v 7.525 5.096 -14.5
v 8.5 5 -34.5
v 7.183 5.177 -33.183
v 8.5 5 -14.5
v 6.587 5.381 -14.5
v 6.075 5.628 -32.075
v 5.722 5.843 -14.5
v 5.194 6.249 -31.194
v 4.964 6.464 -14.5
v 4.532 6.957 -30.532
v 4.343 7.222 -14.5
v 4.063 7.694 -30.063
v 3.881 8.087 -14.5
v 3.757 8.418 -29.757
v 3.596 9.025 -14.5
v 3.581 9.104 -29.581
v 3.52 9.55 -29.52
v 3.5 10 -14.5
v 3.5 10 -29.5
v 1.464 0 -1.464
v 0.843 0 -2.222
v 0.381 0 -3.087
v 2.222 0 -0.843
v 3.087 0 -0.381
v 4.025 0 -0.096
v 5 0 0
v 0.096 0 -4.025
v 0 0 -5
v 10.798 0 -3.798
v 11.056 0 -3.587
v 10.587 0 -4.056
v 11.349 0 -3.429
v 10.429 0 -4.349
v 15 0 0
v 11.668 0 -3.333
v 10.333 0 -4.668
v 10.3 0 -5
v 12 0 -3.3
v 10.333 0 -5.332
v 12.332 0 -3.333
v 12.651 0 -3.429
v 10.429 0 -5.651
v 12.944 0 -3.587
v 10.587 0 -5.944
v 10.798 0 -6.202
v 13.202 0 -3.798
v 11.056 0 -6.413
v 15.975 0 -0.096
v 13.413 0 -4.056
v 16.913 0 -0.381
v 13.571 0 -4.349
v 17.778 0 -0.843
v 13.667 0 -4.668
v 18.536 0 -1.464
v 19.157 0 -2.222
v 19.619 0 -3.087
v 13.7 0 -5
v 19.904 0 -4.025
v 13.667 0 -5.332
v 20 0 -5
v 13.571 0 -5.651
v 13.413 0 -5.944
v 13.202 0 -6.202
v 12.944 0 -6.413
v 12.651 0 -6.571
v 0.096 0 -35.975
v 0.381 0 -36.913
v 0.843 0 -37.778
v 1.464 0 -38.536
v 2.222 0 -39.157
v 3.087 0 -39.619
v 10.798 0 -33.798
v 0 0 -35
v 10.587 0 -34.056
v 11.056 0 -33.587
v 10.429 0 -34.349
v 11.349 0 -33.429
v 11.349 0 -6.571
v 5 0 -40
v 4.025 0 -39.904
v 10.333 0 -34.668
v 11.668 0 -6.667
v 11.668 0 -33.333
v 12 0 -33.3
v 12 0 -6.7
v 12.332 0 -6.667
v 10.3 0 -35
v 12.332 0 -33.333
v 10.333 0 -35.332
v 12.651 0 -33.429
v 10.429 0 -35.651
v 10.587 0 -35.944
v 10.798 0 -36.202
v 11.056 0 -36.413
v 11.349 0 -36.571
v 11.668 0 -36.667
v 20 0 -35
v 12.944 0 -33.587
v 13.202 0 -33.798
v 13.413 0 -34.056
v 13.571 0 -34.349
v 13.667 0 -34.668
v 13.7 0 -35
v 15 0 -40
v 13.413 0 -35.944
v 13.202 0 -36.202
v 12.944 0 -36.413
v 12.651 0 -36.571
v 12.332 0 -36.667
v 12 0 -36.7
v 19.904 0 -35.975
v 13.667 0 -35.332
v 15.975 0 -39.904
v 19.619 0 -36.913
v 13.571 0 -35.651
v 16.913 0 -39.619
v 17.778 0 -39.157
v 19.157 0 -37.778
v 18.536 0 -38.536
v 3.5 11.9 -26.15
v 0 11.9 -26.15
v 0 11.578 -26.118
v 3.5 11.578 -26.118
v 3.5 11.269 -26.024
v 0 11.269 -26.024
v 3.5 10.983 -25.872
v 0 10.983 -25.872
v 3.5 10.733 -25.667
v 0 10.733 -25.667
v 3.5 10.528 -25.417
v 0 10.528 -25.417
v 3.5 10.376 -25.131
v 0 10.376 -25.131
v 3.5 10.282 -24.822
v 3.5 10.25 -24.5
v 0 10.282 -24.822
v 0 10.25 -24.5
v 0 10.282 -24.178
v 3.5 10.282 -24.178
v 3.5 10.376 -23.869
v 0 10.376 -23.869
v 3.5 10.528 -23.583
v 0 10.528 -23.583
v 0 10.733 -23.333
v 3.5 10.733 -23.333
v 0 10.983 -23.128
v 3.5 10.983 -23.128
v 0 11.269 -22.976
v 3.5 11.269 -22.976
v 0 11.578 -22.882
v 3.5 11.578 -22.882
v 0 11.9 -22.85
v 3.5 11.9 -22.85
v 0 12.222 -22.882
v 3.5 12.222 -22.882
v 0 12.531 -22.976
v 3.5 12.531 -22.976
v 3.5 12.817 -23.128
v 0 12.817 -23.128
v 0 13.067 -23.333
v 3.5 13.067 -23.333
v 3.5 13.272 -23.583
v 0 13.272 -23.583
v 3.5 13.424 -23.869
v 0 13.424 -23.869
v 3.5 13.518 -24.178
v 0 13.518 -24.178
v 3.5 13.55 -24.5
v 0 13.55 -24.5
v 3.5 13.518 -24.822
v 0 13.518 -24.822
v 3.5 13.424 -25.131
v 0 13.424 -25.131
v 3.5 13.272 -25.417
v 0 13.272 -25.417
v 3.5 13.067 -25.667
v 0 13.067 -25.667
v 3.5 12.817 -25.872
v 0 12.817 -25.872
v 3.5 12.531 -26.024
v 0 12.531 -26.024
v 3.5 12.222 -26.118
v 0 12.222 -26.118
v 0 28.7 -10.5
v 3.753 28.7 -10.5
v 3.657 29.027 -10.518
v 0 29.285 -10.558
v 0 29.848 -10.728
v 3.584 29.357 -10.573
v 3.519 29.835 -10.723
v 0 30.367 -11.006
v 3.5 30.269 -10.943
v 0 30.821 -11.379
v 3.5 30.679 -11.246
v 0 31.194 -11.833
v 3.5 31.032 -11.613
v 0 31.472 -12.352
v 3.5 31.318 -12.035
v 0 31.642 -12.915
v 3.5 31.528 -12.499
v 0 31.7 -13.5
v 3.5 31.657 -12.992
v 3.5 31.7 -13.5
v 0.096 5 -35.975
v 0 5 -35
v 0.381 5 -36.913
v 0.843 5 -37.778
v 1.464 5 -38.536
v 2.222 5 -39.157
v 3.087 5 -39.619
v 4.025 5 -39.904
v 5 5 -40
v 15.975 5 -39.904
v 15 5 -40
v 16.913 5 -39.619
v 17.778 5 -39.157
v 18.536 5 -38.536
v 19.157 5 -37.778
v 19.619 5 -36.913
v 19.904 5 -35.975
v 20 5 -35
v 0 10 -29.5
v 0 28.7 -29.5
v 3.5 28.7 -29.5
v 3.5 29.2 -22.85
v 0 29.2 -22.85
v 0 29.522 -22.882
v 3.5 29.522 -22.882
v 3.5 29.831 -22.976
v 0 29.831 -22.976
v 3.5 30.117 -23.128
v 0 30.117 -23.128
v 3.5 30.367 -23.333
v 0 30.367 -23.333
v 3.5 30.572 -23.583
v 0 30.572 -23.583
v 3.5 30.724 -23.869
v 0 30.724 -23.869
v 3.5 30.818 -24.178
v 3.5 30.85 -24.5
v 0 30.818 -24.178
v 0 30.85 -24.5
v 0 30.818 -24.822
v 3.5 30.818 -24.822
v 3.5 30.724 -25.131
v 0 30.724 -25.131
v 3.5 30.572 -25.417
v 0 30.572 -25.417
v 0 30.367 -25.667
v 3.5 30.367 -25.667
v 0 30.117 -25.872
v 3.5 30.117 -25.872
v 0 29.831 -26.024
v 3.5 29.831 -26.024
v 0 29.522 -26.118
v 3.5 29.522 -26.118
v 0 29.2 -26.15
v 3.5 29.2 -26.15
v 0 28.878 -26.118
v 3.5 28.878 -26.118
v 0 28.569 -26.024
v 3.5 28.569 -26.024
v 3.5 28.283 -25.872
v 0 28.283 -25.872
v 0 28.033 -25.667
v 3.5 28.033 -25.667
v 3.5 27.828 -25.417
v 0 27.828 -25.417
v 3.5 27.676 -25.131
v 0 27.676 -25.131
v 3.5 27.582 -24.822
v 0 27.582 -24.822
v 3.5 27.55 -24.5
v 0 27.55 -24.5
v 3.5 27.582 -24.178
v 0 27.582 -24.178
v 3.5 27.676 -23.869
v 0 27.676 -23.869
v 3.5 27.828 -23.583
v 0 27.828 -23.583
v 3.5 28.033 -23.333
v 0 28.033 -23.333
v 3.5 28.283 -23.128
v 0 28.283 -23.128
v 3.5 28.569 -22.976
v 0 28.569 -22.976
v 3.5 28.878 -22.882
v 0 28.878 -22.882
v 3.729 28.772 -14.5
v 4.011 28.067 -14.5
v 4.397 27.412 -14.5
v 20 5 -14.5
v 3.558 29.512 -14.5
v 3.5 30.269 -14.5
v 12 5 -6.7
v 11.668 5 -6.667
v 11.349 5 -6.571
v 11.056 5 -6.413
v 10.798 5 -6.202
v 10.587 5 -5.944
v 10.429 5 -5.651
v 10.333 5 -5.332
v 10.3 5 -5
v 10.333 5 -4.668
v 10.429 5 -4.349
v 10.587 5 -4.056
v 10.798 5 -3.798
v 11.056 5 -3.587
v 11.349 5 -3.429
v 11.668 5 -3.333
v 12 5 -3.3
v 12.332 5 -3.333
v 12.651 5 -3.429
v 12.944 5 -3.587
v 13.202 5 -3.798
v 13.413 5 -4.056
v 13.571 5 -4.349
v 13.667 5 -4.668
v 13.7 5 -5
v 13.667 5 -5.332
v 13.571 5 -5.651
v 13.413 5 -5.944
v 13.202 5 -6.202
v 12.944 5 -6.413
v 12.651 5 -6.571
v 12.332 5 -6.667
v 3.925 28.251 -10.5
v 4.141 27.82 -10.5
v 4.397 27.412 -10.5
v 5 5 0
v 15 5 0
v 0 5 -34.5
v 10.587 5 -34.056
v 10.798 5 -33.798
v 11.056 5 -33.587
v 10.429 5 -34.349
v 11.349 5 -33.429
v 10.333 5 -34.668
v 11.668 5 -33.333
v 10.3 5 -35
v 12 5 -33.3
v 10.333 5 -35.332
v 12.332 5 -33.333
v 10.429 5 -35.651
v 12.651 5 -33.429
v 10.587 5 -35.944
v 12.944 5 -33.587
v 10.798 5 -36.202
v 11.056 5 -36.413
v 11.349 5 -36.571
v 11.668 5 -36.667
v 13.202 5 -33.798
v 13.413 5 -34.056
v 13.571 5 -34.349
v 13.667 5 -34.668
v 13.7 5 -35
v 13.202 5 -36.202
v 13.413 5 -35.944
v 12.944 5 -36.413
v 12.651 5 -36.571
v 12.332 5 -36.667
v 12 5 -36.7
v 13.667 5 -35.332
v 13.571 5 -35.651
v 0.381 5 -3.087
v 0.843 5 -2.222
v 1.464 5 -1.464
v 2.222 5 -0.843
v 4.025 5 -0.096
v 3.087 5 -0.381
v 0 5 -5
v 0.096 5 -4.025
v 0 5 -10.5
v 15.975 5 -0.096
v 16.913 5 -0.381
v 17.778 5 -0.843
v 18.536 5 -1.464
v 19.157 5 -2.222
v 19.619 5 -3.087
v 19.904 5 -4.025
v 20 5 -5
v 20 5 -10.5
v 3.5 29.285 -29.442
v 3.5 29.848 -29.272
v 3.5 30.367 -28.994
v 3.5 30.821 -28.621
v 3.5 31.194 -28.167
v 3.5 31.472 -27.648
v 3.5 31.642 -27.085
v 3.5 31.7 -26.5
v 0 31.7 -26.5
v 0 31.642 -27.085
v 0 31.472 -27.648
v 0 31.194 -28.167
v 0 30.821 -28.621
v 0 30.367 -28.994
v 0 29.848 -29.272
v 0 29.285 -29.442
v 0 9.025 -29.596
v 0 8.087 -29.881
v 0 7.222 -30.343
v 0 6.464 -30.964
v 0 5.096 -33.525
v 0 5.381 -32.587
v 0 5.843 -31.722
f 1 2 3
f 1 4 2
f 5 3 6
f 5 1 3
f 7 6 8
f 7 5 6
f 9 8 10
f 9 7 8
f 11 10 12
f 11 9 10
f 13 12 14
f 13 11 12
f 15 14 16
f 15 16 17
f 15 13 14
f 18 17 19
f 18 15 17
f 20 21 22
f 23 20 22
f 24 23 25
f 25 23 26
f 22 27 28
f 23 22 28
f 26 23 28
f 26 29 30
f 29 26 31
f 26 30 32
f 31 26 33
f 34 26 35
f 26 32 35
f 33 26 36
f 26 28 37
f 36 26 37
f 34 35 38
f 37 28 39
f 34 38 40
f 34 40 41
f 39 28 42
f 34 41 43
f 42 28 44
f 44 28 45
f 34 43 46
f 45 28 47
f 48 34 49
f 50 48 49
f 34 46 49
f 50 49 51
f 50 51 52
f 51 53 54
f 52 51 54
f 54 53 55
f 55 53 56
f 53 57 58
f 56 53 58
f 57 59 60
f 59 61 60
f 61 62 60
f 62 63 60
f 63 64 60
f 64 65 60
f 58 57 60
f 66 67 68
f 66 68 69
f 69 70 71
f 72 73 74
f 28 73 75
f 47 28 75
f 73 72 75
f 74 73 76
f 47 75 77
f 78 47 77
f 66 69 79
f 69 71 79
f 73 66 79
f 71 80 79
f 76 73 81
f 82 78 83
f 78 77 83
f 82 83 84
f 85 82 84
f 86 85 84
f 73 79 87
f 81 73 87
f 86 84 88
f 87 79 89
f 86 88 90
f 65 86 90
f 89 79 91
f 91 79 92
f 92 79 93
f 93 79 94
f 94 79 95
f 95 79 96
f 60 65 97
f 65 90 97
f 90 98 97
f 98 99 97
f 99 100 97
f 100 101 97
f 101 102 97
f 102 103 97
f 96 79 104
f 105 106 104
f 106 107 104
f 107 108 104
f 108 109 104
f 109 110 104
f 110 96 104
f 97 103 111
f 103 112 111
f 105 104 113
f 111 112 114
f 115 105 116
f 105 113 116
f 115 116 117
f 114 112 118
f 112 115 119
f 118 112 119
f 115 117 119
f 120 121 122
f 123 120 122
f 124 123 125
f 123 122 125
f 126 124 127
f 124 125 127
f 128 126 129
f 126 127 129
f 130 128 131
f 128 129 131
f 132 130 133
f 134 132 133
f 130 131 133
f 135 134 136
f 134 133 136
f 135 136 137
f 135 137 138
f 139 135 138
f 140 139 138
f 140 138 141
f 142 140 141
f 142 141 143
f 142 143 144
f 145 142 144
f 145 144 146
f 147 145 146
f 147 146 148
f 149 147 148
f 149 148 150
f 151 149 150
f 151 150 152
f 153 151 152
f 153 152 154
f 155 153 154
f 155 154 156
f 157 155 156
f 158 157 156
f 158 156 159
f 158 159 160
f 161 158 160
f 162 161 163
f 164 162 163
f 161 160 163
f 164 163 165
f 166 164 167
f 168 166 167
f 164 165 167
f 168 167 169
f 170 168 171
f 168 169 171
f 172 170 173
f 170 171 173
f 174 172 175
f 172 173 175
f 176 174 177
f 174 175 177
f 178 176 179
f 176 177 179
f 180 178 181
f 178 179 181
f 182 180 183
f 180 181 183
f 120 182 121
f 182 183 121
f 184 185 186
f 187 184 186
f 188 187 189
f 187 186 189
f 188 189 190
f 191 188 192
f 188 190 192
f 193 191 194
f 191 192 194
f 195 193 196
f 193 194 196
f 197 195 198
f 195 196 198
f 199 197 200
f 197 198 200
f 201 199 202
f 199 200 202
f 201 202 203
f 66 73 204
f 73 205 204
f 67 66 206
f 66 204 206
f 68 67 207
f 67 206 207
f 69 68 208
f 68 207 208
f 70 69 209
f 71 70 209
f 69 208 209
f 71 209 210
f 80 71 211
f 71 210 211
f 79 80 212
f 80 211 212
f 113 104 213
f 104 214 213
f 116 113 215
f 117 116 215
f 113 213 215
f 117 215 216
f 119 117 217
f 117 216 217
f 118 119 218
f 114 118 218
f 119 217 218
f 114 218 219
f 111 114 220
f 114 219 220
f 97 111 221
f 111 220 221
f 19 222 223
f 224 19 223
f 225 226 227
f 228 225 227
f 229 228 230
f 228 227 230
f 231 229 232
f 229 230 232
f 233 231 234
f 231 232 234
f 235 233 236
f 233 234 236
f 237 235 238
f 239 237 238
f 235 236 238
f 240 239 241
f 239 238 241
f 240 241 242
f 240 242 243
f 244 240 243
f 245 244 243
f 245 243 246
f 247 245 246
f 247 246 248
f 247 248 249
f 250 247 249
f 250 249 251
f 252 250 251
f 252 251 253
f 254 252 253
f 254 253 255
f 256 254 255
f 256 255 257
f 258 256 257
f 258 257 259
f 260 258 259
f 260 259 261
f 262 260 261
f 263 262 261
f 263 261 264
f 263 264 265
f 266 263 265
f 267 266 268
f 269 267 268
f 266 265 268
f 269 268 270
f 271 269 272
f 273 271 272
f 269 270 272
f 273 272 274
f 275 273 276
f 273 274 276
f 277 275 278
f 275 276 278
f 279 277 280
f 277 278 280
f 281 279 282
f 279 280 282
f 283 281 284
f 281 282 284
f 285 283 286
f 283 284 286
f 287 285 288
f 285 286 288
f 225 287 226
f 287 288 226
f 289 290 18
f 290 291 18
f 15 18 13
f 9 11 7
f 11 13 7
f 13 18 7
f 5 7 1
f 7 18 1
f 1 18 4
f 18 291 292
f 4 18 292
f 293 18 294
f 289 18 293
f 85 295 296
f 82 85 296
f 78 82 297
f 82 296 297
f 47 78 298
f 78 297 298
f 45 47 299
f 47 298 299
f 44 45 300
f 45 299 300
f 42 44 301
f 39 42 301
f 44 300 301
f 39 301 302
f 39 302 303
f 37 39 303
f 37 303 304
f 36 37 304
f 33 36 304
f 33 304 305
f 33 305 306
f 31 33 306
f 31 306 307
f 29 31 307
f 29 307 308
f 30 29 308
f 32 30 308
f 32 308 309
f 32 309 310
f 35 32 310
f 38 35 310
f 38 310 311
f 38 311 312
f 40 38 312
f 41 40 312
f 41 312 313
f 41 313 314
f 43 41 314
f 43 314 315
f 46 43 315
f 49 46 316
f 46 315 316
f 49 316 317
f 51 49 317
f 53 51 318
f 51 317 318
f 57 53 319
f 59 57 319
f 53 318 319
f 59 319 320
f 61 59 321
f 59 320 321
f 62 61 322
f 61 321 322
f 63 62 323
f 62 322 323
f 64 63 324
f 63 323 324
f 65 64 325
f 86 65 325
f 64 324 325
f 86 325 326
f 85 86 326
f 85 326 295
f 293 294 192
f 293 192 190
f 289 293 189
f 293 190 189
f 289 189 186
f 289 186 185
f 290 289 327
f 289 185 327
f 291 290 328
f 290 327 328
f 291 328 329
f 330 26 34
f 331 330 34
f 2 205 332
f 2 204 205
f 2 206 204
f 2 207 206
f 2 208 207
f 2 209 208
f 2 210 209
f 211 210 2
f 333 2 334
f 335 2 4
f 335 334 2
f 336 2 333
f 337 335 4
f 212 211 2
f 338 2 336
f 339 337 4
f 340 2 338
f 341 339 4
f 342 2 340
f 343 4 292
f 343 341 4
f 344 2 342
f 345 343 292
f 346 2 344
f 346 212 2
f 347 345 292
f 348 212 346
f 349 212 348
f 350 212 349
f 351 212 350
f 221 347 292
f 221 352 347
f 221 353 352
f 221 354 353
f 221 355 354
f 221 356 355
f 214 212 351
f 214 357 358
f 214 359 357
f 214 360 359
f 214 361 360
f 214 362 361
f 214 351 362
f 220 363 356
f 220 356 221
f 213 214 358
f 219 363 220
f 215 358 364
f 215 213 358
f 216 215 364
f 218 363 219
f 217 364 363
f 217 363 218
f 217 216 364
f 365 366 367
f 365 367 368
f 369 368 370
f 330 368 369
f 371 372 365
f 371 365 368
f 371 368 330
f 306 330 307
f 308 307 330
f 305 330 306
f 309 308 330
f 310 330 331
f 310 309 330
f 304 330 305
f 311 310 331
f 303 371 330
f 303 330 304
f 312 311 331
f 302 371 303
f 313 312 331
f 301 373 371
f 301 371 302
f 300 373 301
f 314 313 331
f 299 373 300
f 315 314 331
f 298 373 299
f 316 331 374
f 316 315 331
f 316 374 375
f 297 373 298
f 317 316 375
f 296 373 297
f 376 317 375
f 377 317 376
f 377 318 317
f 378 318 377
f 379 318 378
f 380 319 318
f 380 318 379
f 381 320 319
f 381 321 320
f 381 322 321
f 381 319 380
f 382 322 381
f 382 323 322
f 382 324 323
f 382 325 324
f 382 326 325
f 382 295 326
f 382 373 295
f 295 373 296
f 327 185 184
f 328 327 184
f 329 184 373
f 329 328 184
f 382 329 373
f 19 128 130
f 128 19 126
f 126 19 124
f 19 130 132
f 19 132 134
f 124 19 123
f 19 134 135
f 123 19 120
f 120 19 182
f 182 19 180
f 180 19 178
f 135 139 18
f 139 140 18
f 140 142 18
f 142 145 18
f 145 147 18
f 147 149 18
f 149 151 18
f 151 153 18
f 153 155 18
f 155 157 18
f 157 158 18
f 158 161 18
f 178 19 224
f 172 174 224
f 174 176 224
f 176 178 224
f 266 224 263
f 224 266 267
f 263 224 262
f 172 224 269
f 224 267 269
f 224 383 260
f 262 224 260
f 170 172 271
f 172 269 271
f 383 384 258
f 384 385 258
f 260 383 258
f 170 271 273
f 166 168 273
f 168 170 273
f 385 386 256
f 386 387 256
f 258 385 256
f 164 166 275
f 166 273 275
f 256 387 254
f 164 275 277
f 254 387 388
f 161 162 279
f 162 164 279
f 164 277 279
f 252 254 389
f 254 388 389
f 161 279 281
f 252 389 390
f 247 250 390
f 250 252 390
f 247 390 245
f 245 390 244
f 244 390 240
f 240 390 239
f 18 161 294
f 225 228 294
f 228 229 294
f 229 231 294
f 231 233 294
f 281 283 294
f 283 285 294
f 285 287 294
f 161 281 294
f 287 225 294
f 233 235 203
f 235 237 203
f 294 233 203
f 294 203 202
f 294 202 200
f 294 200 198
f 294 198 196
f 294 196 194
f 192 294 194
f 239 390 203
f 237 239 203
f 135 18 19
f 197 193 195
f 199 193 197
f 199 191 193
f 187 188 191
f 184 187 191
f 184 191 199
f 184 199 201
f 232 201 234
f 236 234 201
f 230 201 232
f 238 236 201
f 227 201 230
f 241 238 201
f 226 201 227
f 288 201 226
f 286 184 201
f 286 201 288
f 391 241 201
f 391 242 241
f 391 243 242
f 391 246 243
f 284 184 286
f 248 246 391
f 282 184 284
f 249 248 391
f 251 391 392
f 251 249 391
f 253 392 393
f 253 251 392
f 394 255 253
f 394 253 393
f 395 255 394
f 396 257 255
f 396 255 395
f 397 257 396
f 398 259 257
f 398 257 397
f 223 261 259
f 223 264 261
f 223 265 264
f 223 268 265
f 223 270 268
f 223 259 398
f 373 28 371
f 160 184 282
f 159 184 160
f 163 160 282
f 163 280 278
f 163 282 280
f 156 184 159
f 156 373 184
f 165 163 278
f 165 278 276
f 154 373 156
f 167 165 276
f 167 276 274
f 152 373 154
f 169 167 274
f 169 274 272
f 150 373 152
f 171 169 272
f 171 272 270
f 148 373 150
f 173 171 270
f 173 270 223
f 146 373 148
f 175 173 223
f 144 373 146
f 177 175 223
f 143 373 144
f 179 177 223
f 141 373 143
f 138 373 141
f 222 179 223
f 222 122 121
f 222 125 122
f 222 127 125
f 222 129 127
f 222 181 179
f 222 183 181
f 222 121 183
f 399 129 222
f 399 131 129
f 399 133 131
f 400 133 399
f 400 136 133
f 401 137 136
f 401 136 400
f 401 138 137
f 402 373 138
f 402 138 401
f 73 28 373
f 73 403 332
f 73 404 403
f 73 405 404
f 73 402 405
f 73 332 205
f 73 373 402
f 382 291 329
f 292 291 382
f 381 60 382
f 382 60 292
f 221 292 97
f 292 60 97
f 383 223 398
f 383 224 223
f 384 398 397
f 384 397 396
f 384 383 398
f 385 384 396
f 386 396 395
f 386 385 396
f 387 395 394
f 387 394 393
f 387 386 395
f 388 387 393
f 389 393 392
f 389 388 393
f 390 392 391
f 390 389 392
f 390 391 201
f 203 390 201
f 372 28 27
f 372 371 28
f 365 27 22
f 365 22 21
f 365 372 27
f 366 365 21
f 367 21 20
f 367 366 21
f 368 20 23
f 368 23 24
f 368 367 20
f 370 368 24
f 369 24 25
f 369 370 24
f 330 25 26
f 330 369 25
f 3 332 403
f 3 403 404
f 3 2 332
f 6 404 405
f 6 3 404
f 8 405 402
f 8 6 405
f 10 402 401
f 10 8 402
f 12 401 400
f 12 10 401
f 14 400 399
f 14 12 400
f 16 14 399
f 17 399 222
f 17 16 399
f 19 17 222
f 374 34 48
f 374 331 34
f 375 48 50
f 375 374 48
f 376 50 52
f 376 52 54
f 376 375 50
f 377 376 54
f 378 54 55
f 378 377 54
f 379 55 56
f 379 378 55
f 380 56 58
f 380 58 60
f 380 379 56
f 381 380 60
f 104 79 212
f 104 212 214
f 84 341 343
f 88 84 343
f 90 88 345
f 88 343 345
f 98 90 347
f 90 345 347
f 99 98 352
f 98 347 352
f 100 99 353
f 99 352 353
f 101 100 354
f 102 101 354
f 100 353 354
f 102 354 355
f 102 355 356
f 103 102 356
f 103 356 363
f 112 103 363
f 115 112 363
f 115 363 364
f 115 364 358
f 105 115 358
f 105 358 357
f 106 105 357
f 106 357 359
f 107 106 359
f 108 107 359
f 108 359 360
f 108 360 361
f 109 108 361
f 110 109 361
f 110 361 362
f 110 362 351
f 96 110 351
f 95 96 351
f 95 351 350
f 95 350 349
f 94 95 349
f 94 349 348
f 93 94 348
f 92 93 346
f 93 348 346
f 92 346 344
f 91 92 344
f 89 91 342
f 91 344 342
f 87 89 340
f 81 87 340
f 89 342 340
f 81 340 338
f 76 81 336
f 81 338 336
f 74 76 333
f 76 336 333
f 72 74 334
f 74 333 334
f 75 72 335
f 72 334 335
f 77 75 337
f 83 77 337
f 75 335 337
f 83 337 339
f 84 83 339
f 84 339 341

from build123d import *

# Parameters (mm, degrees)
SKETCH_1_W          = 20
SKETCH_1_H          = 40
EXTRUDE_1_DEPTH     = 5
SKETCH_2_W          = 19
SKETCH_2_H          = 26.7
EXTRUDE_2_DEPTH     = 3.5
SKETCH_3_R          = 1.65
CUT_EXTRUDE_1_DEPTH = 55.816876963
SKETCH_4_R          = 1.7
CUT_EXTRUDE_2_DEPTH = 53.085410625
FILLET_1_R          = 5
FILLET_2_R          = 3
RIB_1_REACH         = 49.698
SKETCH_5_WALL_W     = 126.274874616
SKETCH_5_WALL_H     = 4
FILLET_3_R          = 5


with BuildPart() as part:
    # 草图1 → 凸台-拉伸1 (new body)
    with BuildSketch(Plane(origin=(0, 0, 0), x_dir=(1, 0, 0), z_dir=(0, 1, 0))):
        with Locations((10, 20)):
            Rectangle(SKETCH_1_W, SKETCH_1_H)
    extrude(amount=EXTRUDE_1_DEPTH)

    # 草图2 → 凸台-拉伸2 (add)
    with BuildSketch(Plane.ZY):
        with Locations((-20, 18.35)):
            Rectangle(SKETCH_2_W, SKETCH_2_H)
    extrude(amount=-EXTRUDE_2_DEPTH)

    # 草图3 → 切除-拉伸1 (cut, through all)
    with BuildSketch(Plane.ZY):
        with Locations((-24.5, 29.2)):
            Circle(SKETCH_3_R)
        with Locations(Location((-24.5, 11.9, 0), (0, 0, 180))):
            Circle(SKETCH_3_R)
    extrude(amount=-CUT_EXTRUDE_1_DEPTH, mode=Mode.SUBTRACT)

    # 草图4 → 切除-拉伸2 (cut, through all)
    with BuildSketch(Plane(origin=(0, 5, 0), x_dir=(1, 0, 0), z_dir=(0, 1, 0))):
        with Locations(Location((12, 35, 0), (0, 0, 270))):
            Circle(SKETCH_4_R)
        with Locations(Location((12, 5, 0), (0, 0, 90))):
            Circle(SKETCH_4_R)
    extrude(amount=-CUT_EXTRUDE_2_DEPTH, mode=Mode.SUBTRACT)

    # 圆角1
    fillet_1_edges = [part.edges().sort_by_distance(p)[0] for p in [
        (0, 2.5, -40),
        (20, 2.5, -40),
        (20, 2.5, 0),
        (0, 2.5, 0),
    ]]
    fillet(fillet_1_edges, radius=FILLET_1_R)

    # 圆角2
    fillet_2_edges = [part.edges().sort_by_distance(p)[0] for p in [
        (1.75, 31.7, -29.5),
        (1.75, 31.7, -10.5),
    ]]
    fillet(fillet_2_edges, radius=FILLET_2_R)

    # 草图5 wall → 筋1 (add, up to next)
    with BuildSketch(Plane(origin=(11.75, 16.85, -10.5), x_dir=(0.571368826083, -0.820693404738, 0), z_dir=(0.820693404738, 0.571368826083, 0)), mode=Mode.PRIVATE) as rib_1_sk1:
        with Locations((0, 2)):
            Rectangle(SKETCH_5_WALL_W, SKETCH_5_WALL_H)
    rib_1_tool1 = extrude(rib_1_sk1.sketch, amount=-RIB_1_REACH, mode=Mode.PRIVATE) - part.part
    add(rib_1_tool1.solids().sort_by_distance((11.75, 16.85, -10.5))[0])

    # 圆角3
    fillet_3_edges = [part.edges().sort_by_distance(p)[0] for p in [
        (1.75, 5, -29.5),
        (3.5, 5, -22),
        (3.5, 28.7, -12.5),
    ]]
    fillet(fillet_3_edges, radius=FILLET_3_R)


solid = part.part
